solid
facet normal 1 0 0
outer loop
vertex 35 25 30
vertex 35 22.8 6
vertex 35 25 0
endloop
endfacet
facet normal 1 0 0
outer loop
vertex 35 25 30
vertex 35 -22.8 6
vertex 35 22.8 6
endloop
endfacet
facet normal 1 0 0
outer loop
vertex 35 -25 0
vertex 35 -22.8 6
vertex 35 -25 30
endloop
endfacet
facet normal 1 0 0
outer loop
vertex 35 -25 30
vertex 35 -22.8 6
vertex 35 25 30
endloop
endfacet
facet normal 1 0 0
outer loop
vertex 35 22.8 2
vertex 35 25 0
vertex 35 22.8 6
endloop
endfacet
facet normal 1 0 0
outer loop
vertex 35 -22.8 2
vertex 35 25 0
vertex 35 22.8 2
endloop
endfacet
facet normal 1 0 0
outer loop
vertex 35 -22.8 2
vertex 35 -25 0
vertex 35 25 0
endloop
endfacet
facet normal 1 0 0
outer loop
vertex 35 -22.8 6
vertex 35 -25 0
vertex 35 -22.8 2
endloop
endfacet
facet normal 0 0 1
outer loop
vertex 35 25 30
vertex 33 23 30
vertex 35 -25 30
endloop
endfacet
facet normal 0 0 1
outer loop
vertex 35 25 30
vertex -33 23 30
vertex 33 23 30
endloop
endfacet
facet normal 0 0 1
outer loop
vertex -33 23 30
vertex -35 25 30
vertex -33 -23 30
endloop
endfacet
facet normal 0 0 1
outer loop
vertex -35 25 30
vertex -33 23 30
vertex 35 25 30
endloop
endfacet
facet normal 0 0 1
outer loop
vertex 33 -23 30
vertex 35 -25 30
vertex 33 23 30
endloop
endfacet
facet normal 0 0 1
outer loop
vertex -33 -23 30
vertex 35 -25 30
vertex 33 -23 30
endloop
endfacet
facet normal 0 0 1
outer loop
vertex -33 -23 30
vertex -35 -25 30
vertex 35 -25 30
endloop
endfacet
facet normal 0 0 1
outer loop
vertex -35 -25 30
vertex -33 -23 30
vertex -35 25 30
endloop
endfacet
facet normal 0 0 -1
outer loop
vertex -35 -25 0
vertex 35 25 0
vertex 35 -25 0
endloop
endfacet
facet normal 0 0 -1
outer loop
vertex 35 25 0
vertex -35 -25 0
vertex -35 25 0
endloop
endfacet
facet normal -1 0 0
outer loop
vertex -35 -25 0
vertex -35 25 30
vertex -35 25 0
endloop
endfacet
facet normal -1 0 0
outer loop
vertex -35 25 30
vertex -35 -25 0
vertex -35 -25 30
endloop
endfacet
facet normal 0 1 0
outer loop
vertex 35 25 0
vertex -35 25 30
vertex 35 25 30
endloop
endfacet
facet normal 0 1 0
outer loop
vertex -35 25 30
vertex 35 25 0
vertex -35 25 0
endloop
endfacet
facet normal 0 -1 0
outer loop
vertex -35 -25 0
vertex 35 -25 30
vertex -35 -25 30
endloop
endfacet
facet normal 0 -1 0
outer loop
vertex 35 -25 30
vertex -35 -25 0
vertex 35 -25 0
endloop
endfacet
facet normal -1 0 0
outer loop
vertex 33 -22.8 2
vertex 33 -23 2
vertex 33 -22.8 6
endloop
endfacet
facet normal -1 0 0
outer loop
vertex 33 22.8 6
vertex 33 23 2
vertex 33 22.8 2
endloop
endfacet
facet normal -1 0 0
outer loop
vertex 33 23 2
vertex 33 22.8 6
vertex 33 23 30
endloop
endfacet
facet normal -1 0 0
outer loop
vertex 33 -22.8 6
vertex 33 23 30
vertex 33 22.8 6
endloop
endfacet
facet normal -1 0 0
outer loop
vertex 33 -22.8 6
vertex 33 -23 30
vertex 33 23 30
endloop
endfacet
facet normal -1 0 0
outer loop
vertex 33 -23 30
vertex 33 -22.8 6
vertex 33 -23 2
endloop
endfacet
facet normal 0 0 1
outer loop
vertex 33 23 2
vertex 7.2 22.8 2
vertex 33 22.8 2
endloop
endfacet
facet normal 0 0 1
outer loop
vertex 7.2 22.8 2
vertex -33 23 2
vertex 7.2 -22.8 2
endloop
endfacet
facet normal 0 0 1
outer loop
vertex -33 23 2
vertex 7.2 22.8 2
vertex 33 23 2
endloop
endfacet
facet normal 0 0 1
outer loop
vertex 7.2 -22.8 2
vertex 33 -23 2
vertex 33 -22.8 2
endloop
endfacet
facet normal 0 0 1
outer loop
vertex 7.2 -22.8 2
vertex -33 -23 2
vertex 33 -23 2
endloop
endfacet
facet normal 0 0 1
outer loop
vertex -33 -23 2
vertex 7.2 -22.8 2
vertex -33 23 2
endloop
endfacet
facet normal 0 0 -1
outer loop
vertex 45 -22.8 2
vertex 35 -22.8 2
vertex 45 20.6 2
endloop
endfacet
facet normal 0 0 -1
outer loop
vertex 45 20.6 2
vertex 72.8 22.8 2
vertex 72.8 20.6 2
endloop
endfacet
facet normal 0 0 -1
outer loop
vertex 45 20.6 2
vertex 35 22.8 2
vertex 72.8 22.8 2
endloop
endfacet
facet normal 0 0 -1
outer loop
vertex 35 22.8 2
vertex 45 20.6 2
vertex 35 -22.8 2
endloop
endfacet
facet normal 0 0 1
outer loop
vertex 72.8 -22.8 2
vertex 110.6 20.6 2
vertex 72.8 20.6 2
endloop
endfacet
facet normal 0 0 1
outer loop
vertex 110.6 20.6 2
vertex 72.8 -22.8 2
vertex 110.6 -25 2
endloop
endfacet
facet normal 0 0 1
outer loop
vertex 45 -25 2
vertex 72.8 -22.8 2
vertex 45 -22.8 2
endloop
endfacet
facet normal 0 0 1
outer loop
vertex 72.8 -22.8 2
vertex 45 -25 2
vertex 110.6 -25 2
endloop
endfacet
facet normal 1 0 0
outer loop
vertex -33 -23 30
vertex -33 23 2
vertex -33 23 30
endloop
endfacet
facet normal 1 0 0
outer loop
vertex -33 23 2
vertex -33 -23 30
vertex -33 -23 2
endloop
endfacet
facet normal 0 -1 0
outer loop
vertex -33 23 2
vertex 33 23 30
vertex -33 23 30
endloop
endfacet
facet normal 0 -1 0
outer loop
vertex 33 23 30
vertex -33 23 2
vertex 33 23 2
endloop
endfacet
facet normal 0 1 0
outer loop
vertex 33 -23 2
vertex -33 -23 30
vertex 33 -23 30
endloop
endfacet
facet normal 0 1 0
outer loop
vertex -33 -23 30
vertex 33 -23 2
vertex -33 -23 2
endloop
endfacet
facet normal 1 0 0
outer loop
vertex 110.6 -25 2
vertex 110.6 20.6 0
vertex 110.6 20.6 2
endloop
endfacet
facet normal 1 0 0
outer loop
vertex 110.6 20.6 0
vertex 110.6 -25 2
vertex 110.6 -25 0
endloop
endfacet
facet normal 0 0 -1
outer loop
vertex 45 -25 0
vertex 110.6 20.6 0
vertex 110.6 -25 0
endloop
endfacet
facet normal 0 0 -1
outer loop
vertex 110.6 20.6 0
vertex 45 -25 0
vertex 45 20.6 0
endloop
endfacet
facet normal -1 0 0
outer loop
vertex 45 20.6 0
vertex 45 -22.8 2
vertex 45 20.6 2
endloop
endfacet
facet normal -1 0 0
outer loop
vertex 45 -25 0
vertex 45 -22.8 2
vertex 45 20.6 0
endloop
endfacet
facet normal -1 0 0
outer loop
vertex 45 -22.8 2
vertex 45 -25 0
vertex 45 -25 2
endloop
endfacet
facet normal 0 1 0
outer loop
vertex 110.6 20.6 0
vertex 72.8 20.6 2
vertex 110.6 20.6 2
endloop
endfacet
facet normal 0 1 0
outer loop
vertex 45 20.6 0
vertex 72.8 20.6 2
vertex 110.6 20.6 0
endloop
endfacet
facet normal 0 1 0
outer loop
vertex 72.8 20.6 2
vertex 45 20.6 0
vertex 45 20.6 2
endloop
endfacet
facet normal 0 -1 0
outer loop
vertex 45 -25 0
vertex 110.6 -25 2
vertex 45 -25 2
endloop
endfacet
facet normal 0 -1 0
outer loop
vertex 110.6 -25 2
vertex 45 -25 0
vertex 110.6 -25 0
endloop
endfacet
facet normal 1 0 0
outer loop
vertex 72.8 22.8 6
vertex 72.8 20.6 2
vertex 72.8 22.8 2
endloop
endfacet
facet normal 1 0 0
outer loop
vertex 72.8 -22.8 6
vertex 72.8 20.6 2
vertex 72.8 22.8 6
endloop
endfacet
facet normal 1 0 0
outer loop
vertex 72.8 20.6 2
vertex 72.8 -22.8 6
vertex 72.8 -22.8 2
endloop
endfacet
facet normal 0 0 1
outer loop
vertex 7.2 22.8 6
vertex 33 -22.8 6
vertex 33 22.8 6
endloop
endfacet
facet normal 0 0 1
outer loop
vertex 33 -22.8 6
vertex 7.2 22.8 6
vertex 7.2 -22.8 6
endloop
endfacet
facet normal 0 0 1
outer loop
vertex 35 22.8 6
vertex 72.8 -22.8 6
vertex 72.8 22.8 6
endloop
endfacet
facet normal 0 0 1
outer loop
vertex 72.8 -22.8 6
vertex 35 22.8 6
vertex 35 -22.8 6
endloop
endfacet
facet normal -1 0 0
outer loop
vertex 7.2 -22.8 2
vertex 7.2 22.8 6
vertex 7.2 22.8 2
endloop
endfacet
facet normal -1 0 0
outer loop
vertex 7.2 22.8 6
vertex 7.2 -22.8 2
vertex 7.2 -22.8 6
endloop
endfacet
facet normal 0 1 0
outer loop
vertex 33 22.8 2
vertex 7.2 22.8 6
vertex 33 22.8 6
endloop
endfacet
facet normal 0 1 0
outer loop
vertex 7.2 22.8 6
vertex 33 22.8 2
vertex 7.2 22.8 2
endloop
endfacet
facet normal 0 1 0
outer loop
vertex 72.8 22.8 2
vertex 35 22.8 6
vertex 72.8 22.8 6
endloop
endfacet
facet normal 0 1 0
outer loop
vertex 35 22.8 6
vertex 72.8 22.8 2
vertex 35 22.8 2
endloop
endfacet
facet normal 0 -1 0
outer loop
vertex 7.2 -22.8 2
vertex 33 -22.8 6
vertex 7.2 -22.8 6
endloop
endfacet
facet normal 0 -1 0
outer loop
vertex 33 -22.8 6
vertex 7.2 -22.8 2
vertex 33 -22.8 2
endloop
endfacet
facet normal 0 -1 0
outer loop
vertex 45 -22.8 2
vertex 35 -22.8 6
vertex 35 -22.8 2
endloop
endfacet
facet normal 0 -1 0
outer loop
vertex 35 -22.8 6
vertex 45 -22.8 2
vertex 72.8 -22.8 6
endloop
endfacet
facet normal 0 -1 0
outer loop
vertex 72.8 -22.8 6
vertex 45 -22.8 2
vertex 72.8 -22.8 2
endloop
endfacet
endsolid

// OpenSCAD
// Two-part enclosure for a small electronics board (e.g. Arduino-based logger)
// Print orientation: box standing on the bed, lid flat on the bed

// ---------------- Parameters ----------------
box_x      = 70;    // box outer length (X)
box_y      = 50;    // box outer width (Y)
box_h      = 30;    // box outer height (Z)
box_wall   = 2;     // box wall thickness
box_floor  = 2;     // box floor thickness (separate from wall for clarity)

gap        = 10;    // gap between box and lid (X direction)

lip_x      = 65.6;  // lip outer length (X)
lip_y      = 45.6;  // lip outer width (Y)
lip_t      = 1.5;   // lip wall thickness
lip_h      = 4;     // lip height above plate

eps        = 0.5;   // cutter overshoot

$fn = 64;

// ---------------- Derived ----------------
box_inner_x = box_x - 2*box_wall;   // 66
box_inner_y = box_y - 2*box_wall;   // 46
plate_t     = 2;                    // lid plate thickness

// ---------------- Model ----------------
union() {
    // Part 1: Box, open top
    difference() {
        translate([-box_x/2, -box_y/2, 0])
            cube([box_x, box_y, box_h]);
        translate([-box_inner_x/2, -box_inner_y/2, box_floor])
            cube([box_inner_x, box_inner_y, box_h - box_floor]);
    }

    // Part 2: Lid, printed upside down
    union() {
        translate([box_x/2 + gap, -box_y/2, 0])
            cube([lip_x, lip_y, plate_t]);          // plate
        translate([(box_x + gap)/2 - lip_x/2, -lip_y/2, plate_t])
            cube([lip_x, lip_y, lip_h]);            // lip (overlaps plate -> solid)
    }
}
